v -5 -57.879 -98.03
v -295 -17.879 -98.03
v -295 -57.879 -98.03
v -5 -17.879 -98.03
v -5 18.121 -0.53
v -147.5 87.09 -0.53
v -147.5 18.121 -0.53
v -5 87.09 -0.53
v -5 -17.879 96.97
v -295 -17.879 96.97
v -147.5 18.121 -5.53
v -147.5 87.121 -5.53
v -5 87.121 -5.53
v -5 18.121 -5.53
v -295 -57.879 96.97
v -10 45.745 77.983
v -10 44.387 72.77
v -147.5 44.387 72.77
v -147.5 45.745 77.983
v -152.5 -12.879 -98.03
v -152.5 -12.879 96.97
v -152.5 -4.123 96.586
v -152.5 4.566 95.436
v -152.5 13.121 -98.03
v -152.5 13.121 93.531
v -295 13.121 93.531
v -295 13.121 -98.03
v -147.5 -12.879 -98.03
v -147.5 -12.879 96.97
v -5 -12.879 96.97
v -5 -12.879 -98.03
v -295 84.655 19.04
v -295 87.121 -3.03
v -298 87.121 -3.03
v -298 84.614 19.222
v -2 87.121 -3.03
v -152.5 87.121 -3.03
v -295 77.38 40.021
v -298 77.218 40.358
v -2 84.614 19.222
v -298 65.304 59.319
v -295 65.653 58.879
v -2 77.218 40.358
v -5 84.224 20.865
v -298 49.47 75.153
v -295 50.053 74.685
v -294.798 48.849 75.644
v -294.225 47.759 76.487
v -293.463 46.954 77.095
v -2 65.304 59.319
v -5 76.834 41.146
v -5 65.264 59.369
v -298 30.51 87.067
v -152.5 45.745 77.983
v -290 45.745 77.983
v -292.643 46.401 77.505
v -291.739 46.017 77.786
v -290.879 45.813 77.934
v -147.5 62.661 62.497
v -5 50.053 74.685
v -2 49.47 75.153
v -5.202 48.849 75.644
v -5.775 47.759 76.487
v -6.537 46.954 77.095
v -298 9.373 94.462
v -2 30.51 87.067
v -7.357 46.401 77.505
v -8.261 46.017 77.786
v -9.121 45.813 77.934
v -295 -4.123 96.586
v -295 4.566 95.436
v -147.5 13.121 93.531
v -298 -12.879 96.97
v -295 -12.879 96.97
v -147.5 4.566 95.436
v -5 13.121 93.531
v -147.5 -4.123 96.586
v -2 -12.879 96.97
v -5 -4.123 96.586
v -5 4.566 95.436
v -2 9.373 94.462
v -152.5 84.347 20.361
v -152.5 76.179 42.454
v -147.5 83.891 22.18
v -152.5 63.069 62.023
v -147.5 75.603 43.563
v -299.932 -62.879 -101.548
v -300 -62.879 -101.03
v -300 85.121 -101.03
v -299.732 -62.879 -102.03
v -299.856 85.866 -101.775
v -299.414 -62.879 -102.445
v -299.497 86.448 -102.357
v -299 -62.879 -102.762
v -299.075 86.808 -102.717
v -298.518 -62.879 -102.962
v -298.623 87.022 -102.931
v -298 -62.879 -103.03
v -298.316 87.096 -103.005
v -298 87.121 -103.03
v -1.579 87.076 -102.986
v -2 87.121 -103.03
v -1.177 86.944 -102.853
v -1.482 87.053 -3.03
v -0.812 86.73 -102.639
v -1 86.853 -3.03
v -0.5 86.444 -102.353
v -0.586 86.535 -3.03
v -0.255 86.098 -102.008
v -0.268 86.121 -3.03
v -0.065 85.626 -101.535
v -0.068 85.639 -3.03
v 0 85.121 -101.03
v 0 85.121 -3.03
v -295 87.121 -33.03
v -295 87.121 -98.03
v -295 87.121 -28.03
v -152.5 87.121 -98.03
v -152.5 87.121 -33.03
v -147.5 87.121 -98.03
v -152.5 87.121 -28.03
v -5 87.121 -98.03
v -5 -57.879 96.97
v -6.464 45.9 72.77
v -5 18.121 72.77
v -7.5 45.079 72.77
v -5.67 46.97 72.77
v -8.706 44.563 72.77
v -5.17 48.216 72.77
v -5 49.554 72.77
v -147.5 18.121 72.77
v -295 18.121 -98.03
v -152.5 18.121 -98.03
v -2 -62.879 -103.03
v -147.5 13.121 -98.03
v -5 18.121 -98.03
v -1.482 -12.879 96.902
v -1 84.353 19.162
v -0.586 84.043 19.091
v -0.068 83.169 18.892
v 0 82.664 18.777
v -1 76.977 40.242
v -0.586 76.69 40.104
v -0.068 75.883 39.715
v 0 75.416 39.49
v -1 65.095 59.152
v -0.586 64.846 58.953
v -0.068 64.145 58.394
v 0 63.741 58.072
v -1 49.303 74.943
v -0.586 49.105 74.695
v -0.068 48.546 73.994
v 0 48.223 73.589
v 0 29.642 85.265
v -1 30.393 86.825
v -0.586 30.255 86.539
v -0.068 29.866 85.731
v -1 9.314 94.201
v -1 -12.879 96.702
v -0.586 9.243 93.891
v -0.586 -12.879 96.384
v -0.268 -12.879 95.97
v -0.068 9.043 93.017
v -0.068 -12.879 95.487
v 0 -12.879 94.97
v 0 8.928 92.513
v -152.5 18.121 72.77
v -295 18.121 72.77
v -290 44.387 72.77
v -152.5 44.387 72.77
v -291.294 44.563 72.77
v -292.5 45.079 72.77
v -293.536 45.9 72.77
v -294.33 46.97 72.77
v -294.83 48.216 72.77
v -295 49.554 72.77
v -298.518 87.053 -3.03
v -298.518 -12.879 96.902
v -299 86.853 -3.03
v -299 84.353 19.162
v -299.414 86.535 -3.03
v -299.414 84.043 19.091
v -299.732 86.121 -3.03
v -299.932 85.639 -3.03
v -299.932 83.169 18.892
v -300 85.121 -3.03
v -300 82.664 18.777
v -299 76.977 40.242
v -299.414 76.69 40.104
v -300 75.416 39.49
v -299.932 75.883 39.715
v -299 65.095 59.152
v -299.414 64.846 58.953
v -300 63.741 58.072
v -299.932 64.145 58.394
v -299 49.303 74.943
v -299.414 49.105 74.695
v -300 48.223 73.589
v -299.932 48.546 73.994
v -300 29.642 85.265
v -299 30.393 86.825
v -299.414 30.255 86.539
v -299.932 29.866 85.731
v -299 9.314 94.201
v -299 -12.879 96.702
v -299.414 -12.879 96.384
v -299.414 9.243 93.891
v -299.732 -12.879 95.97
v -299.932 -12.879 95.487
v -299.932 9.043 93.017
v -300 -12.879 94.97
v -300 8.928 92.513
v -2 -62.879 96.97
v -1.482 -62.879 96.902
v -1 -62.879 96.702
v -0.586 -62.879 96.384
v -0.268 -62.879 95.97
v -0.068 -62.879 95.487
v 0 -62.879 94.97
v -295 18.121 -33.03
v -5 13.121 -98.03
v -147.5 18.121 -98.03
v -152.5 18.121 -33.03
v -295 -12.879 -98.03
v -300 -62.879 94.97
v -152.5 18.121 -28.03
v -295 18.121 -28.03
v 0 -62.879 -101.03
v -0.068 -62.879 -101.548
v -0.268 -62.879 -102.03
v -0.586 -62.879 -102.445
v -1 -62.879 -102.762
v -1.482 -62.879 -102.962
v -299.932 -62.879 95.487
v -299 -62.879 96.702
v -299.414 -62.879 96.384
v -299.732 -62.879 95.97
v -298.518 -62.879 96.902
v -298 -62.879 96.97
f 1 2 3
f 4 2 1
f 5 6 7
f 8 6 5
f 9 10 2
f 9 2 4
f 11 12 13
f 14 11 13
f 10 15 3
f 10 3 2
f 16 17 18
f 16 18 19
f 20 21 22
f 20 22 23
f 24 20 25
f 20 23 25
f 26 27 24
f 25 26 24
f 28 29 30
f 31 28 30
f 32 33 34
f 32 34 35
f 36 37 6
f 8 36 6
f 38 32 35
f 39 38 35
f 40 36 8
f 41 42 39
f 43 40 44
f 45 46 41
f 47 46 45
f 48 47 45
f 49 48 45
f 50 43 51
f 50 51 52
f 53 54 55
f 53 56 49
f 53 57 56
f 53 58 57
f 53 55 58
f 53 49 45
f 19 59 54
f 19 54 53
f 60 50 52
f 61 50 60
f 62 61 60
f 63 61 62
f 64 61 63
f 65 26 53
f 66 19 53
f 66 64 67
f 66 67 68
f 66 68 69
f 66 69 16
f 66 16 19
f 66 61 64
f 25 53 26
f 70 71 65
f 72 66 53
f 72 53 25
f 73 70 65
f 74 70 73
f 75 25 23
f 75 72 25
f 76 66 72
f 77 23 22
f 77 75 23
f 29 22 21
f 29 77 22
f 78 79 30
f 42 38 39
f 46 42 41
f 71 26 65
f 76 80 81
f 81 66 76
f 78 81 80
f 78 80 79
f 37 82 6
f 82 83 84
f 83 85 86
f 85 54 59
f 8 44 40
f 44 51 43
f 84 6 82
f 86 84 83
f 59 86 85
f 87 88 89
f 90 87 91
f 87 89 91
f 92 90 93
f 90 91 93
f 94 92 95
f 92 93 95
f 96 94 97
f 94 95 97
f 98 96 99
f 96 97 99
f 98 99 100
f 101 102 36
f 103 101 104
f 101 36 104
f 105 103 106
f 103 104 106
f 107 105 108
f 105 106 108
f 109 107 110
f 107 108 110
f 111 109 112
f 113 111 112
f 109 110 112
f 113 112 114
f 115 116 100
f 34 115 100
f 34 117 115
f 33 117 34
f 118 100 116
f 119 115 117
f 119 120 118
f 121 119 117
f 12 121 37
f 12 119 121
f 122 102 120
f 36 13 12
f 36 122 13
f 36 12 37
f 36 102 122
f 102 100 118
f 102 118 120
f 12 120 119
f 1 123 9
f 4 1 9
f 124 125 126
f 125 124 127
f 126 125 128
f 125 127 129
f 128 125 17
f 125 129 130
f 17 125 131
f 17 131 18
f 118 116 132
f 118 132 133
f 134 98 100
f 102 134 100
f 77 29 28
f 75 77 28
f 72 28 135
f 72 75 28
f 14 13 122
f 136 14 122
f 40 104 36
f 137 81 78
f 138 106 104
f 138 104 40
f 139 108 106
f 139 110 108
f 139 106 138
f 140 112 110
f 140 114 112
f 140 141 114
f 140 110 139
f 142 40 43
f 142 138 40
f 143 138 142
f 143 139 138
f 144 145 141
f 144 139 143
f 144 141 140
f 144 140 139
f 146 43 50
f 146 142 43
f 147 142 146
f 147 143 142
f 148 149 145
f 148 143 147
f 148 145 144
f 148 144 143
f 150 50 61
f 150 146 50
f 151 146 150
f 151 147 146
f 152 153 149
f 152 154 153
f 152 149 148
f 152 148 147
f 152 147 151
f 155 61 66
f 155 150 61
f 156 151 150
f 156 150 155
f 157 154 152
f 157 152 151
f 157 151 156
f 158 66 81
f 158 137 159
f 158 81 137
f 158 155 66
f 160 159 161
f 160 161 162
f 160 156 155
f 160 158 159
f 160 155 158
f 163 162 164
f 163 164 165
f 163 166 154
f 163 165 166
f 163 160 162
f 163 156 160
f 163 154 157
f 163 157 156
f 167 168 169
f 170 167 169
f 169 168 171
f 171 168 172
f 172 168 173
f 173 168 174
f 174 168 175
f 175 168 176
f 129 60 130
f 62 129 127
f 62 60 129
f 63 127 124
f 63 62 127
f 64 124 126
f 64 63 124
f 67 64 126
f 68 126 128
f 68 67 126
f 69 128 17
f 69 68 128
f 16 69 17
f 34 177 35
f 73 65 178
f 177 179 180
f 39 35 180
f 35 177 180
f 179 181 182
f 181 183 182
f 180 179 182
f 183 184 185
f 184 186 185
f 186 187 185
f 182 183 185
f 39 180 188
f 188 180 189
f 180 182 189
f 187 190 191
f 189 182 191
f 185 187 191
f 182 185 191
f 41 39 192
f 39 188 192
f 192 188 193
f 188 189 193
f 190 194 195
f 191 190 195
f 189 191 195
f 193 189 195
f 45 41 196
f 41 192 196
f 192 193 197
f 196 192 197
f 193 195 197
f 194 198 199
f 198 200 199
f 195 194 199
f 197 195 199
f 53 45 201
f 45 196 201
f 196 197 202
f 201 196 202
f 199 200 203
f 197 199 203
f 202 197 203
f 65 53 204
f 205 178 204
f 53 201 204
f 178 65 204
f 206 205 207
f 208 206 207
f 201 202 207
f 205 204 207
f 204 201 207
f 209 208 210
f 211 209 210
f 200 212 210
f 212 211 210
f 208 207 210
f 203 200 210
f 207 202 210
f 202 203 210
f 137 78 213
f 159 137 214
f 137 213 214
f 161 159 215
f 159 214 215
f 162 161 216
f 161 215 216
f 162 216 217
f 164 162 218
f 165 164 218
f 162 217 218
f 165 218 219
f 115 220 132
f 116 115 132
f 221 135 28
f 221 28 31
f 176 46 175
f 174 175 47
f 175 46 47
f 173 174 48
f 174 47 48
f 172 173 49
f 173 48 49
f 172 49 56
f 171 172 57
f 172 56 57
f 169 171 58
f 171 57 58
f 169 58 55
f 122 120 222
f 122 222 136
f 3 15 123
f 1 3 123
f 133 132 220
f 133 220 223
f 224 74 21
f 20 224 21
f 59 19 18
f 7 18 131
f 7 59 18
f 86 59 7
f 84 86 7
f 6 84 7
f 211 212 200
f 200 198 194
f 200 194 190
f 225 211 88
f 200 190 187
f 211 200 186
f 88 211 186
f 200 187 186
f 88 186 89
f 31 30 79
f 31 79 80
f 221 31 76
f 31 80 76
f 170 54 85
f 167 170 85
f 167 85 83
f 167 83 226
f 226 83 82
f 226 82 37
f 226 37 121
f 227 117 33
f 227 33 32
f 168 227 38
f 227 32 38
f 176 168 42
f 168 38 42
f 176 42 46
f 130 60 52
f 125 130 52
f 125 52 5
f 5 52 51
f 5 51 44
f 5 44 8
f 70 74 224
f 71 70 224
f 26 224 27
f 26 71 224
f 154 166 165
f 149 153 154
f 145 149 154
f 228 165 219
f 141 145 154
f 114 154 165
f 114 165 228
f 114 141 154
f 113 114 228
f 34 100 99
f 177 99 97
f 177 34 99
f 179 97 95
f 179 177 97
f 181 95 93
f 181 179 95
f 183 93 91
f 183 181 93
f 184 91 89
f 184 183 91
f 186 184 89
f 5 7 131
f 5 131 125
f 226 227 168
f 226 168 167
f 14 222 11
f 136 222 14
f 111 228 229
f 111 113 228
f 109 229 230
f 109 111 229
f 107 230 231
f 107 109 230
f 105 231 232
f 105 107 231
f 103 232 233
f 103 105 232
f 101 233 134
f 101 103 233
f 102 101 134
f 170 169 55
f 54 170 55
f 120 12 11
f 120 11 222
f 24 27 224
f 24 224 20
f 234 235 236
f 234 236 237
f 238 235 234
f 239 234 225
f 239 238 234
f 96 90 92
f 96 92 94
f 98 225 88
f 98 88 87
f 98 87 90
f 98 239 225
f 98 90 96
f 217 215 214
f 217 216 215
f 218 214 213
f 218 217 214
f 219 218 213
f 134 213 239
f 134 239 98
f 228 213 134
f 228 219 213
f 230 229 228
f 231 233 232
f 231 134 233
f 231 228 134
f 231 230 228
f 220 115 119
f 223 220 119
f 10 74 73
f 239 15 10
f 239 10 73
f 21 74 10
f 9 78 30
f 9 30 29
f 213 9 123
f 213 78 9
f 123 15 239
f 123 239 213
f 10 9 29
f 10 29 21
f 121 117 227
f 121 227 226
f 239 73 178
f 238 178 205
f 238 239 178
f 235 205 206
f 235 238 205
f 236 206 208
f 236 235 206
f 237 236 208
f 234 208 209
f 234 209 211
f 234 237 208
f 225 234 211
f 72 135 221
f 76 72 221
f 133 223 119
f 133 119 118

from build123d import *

# Parameters (mm, degrees)
BOSS_EXTRUDE1_DEPTH = 300
SKETCH2_W           = 142.5
SKETCH2_H           = 65
SKETCH2_H_2         = 92.5
SKETCH2_H_3         = 22.5
SKETCH2_H_4         = 2.5
CUT_EXTRUDE1_DEPTH  = 69
SKETCH3_W           = 142.5
SKETCH3_H           = 26
SKETCH3_W_2         = 290
SKETCH3_H_2         = 40
CUT_EXTRUDE2_DEPTH  = 195
BOSS_EXTRUDE2_DEPTH = 290
FILLET1_R           = 2
FILLET2_R           = 5


with BuildPart() as part:
    # Sketch1 → Boss-Extrude1 (new body)
    with BuildSketch(Plane(origin=(0, 0, 0), x_dir=(0, 0, -1), z_dir=(1, 0, 0))):
        with BuildLine():
            Line((-96.96969697, -62.878787879), (103.03030303, -62.878787879))
            Line((103.03030303, -62.878787879), (103.03030303, 87.121212121))
            Line((103.03030303, 87.121212121), (3.03030303, 87.121212121))
            ThreePointArc((3.03030303, 87.121212121), (-67.680375088, 57.83189024), (-96.96969697, -12.878787879))
            Line((-96.96969697, -12.878787879), (-96.96969697, -62.878787879))
        make_face()
    extrude(amount=-BOSS_EXTRUDE1_DEPTH)

    # Sketch2 → Cut-Extrude1 (cut)
    with BuildSketch(Plane(origin=(0, 87.121212121, 0), x_dir=(1, 0, 0), z_dir=(0, 1, 0))):
        with Locations((-223.75, 65.53030303)):
            Rectangle(SKETCH2_W, SKETCH2_H)
        with Locations((-76.25, 51.78030303)):
            Rectangle(SKETCH2_W, SKETCH2_H_2)
        with Locations((-76.25, -45.71969697)):
            Rectangle(SKETCH2_W, SKETCH2_H_2)
        with Locations((-223.75, -45.71969697)):
            Rectangle(SKETCH2_W, SKETCH2_H_2)
        with Locations((-223.75, 16.78030303)):
            Rectangle(SKETCH2_W, SKETCH2_H_3)
        with Locations((-223.75, 4.28030303)):
            Rectangle(SKETCH2_W, SKETCH2_H_4)
        with Locations((-223.75, 1.78030303)):
            Rectangle(SKETCH2_W, SKETCH2_H_4)
    extrude(amount=-CUT_EXTRUDE1_DEPTH, mode=Mode.SUBTRACT)

    # Sketch3 → Cut-Extrude2 (cut)
    with BuildSketch(Plane.XY.offset(96.96969697)):
        with Locations((-76.25, 0.121212121)):
            Rectangle(SKETCH3_W, SKETCH3_H)
        with Locations((-223.75, 0.121212121)):
            Rectangle(SKETCH3_W, SKETCH3_H)
        with Locations((-150, -37.878787879)):
            Rectangle(SKETCH3_W_2, SKETCH3_H_2)
    extrude(amount=-CUT_EXTRUDE2_DEPTH, mode=Mode.SUBTRACT)

    # Sketch4 → Boss-Extrude2 (add)
    with BuildSketch(Plane(origin=(-295, 0, 0), x_dir=(0, 0, -1), z_dir=(1, 0, 0))):
        with BuildLine():
            Line((-72.769752814, 18.121212121), (-72.769752814, 44.386834741))
            ThreePointArc((-72.769752814, 44.386834741), (-80.804635484, 31.805695829), (-86.769474252, 18.121212121))
            Line((-86.769474252, 18.121212121), (-72.769752814, 18.121212121))
        make_face()
        with BuildLine():
            ThreePointArc((-86.769474252, 18.121212121), (-80.804635484, 31.805695829), (-72.769752814, 44.386834741))
            Line((-72.769752814, 44.386834741), (-77.983342338, 45.745347629))
            ThreePointArc((-77.983342338, 45.745347629), (-86.036408668, 32.586813044), (-91.96969697, 18.346202113))
            Line((-91.96969697, 18.346202113), (-91.96969697, 18.121212121))
            Line((-91.96969697, 18.121212121), (-86.769474252, 18.121212121))
        make_face()
    extrude(amount=BOSS_EXTRUDE2_DEPTH)

    # Fillet1
    fillet1_edges = [part.edges().sort_by_distance(p)[0] for p in [
        (-300, 12.121212121, -103.03030303),
        (-300, 87.121212121, -53.03030303),
        (-300, 57.83189024, 67.680375088),
        (-300, -37.878787879, 96.96969697),
        (0, 57.83189024, 67.680375088),
        (0, 87.121212121, -53.03030303),
        (0, 12.121212121, -103.03030303),
        (0, -37.878787879, 96.96969697),
    ]]
    fillet(fillet1_edges, radius=FILLET1_R)

    # Fillet2
    fillet2_edges = [part.edges().sort_by_distance(p)[0] for p in [
        (-5, 45.066091185, 75.376547576),
        (-295, 45.066091185, 75.376547576),
    ]]
    fillet(fillet2_edges, radius=FILLET2_R)


solid = part.part
